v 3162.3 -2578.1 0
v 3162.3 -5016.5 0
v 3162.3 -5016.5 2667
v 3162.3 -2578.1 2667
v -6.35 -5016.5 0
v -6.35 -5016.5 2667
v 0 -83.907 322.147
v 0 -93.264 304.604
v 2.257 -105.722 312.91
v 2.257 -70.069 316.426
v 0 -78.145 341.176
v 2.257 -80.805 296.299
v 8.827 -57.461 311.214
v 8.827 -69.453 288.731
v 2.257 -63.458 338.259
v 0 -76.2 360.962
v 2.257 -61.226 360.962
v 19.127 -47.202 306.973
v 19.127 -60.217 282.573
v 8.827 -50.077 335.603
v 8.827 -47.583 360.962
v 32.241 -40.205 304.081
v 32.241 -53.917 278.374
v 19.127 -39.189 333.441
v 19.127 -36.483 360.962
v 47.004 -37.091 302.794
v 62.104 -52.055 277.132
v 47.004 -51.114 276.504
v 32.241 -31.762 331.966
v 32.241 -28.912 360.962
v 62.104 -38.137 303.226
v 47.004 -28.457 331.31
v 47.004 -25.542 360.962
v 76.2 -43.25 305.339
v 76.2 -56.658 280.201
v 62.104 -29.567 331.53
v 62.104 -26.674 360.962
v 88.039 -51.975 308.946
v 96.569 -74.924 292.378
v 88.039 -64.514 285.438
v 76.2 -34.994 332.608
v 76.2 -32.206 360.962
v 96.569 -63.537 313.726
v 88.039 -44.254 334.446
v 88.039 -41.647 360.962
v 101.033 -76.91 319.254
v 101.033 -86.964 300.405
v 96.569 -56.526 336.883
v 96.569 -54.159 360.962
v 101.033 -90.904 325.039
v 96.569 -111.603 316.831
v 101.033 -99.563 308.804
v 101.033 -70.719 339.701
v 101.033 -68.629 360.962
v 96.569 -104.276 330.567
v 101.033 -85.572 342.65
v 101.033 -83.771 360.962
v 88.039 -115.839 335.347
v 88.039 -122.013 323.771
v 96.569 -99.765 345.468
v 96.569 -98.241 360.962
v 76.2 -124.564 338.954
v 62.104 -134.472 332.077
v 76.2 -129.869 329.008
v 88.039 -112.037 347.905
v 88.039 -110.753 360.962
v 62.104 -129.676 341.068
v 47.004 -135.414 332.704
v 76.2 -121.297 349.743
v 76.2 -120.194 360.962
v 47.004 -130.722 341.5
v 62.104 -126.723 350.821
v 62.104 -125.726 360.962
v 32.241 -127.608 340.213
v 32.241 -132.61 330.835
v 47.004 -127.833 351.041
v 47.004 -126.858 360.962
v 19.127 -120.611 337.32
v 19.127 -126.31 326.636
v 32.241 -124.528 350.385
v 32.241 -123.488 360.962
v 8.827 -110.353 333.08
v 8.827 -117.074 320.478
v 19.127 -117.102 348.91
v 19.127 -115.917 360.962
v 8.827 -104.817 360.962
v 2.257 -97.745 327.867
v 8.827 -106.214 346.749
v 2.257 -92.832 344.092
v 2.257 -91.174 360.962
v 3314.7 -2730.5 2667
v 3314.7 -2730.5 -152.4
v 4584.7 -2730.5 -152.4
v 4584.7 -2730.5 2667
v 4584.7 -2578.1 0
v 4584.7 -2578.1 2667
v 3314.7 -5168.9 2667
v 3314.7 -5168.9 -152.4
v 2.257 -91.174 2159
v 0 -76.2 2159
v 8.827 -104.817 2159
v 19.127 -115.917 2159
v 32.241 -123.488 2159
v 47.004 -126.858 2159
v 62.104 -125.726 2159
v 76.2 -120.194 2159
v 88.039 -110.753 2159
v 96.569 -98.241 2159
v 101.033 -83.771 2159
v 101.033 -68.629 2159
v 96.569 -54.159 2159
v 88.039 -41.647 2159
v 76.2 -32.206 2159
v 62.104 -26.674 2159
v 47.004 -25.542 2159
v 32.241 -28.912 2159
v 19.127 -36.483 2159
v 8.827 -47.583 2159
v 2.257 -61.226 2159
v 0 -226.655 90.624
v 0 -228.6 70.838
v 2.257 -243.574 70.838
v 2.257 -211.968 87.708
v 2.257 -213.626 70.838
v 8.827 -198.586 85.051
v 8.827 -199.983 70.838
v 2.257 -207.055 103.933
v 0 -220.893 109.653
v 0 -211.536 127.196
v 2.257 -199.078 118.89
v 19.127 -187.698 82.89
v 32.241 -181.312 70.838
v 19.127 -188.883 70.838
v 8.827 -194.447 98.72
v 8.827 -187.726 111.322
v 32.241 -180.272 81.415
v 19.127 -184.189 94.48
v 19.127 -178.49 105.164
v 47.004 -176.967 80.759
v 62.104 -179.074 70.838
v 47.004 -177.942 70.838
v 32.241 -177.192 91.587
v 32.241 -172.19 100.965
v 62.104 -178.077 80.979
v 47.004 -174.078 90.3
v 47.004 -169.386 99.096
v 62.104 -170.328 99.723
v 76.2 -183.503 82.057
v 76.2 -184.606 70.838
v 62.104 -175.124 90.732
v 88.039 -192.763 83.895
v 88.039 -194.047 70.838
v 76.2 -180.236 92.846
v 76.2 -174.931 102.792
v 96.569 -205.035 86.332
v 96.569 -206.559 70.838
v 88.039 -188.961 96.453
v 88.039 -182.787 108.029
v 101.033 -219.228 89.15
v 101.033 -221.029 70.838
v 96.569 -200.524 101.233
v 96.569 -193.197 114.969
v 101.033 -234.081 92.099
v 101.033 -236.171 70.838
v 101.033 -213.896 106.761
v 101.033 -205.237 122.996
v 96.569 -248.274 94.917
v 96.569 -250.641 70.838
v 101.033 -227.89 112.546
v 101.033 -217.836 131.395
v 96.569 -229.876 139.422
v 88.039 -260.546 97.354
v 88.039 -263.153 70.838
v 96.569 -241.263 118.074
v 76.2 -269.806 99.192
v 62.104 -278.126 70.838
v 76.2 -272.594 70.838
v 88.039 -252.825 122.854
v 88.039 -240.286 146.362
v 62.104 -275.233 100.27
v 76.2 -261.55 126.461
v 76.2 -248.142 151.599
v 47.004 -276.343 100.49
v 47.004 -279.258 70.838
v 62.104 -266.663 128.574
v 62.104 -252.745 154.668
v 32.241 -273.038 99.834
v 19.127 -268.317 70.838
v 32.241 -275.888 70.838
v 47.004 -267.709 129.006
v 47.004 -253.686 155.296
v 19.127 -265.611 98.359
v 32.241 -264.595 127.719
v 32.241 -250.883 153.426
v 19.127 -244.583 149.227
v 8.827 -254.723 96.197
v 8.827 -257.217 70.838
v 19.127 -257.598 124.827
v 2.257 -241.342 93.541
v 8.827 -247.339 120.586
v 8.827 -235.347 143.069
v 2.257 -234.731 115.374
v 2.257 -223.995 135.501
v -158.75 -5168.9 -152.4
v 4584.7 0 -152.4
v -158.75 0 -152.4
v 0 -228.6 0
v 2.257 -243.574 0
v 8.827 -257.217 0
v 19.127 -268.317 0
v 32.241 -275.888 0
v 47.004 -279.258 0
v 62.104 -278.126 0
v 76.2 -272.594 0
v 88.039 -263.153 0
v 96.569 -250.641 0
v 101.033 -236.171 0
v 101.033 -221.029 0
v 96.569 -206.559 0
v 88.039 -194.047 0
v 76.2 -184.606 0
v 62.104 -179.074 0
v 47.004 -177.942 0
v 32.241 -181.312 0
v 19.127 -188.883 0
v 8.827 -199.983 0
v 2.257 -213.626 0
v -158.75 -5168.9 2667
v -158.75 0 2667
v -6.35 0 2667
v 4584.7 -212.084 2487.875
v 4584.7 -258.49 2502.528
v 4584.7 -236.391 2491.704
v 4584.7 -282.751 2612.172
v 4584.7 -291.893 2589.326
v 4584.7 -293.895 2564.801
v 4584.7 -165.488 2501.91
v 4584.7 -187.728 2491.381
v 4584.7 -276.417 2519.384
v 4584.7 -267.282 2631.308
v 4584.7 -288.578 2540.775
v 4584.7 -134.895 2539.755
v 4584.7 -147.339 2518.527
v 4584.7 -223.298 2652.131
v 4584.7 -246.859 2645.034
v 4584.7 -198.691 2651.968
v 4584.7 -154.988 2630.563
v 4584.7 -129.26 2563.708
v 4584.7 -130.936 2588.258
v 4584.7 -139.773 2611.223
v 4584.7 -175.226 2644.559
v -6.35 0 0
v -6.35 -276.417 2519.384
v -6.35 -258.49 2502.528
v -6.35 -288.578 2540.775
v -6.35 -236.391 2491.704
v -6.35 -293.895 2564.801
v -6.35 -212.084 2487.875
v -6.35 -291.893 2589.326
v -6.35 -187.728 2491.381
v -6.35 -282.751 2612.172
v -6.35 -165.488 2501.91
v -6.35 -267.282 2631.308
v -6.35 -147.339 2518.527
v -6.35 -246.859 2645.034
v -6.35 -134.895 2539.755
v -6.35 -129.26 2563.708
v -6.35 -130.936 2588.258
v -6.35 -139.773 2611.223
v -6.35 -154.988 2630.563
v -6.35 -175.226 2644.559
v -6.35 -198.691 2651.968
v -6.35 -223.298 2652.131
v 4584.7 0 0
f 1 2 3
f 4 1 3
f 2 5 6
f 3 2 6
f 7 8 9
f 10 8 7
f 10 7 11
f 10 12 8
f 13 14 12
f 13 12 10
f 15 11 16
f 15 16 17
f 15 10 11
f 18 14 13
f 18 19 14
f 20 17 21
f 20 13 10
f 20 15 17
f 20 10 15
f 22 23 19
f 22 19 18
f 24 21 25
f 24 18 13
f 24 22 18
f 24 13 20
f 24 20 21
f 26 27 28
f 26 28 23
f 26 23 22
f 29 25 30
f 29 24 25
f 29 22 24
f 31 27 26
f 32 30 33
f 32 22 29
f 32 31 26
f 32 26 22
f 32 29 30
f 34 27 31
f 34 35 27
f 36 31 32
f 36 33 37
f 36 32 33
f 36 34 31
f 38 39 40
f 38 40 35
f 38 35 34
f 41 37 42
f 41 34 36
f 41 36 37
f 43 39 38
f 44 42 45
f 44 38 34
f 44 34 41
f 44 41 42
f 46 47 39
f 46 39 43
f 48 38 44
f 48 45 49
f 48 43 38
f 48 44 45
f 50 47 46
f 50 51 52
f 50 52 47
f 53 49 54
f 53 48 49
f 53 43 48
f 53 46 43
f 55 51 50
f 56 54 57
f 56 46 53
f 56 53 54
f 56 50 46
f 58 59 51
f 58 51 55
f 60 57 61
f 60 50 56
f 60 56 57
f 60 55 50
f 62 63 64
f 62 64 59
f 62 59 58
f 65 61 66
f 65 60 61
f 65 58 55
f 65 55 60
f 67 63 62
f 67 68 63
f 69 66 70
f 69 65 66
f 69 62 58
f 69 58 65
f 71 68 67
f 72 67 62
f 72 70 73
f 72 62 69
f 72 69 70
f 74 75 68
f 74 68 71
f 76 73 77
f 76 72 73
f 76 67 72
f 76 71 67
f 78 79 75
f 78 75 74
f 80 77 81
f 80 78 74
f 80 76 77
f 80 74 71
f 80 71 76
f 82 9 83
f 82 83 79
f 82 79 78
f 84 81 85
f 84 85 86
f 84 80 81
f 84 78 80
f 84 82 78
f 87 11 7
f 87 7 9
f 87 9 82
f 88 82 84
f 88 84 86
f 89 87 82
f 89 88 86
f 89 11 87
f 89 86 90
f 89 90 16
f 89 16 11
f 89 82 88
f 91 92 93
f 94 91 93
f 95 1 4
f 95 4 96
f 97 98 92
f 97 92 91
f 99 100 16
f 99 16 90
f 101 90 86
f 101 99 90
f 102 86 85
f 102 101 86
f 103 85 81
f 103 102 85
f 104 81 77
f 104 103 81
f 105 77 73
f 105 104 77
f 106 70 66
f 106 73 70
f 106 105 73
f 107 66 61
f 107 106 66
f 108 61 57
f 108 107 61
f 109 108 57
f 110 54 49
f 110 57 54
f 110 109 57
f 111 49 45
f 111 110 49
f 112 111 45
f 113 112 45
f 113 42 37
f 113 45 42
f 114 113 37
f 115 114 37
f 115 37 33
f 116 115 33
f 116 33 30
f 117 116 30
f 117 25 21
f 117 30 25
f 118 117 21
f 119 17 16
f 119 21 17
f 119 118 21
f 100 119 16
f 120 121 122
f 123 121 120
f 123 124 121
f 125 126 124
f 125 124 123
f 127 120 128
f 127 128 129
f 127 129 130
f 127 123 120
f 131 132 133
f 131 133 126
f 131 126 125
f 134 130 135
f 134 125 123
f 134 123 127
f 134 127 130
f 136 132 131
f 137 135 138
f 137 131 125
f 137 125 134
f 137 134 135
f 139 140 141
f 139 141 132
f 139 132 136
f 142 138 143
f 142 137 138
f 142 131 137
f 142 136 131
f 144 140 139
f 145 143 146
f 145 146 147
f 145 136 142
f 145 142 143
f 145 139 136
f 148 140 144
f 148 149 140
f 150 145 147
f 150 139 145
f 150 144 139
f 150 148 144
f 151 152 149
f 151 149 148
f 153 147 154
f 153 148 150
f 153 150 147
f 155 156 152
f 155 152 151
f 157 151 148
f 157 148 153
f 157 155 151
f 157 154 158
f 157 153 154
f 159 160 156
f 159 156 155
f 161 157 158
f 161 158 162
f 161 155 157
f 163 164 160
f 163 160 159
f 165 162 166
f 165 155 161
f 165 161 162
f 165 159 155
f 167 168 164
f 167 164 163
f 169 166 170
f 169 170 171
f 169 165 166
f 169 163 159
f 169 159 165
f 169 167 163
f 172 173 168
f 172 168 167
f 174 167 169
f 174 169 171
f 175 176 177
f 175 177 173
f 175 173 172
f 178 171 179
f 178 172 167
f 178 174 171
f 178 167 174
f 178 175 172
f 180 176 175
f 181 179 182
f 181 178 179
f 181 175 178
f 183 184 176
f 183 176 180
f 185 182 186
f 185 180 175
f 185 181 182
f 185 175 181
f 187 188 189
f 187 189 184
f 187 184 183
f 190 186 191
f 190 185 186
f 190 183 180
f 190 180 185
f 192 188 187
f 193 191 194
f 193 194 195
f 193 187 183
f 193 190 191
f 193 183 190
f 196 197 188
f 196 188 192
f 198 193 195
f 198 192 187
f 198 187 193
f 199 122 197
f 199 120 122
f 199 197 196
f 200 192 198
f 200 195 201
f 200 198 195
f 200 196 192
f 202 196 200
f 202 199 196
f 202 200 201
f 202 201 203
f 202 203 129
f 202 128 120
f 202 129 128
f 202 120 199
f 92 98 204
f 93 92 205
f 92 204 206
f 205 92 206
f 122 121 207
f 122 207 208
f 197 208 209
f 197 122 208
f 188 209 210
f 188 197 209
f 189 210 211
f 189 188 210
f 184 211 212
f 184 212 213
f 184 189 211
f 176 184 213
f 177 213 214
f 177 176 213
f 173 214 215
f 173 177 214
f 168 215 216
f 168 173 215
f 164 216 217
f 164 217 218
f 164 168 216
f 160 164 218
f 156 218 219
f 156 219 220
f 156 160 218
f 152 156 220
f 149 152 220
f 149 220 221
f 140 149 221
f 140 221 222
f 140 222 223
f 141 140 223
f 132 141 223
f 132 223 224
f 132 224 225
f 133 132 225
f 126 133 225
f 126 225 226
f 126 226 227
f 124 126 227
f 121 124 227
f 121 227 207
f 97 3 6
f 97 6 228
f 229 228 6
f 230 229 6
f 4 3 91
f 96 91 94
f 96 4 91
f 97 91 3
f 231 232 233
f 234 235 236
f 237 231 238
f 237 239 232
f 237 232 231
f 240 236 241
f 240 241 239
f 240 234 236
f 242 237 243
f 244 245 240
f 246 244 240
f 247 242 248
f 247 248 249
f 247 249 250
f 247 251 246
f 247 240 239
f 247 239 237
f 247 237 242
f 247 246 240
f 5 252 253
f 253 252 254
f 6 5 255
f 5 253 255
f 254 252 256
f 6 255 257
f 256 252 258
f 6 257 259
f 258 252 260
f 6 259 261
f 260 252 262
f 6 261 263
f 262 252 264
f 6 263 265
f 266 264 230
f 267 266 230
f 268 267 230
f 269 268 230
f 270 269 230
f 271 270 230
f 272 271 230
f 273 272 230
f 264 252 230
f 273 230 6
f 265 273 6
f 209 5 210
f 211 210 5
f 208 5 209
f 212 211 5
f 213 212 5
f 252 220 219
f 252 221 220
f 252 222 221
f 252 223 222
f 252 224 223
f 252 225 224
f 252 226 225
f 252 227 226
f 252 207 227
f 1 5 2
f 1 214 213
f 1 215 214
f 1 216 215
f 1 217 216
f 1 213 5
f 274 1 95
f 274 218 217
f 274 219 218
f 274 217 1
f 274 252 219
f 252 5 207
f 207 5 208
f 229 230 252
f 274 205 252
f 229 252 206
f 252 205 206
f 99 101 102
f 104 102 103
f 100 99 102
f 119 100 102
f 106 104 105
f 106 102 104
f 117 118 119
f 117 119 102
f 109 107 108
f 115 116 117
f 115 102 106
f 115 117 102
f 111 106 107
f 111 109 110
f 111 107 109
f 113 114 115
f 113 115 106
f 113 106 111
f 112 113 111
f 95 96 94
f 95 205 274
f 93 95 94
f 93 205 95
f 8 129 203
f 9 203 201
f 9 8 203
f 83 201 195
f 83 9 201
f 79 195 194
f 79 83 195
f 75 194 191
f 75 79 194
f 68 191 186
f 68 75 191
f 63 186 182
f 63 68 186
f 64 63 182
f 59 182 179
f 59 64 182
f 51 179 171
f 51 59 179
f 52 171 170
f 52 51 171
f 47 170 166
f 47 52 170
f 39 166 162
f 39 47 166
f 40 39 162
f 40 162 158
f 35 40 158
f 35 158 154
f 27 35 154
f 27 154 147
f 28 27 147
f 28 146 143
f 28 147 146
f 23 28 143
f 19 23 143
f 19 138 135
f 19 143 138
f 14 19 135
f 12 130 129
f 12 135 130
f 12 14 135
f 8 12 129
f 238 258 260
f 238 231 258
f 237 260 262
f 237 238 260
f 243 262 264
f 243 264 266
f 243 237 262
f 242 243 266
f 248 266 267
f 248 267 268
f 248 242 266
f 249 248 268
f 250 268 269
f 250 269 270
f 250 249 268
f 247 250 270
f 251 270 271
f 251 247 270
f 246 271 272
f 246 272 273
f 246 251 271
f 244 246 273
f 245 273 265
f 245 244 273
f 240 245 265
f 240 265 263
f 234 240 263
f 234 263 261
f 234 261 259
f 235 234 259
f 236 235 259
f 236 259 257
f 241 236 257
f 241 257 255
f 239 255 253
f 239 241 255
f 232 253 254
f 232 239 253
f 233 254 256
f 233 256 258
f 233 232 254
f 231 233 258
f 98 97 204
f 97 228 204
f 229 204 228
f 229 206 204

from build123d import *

# Parameters (mm, degrees)
F3_DEPTH  = 152.4
F4_DEPTH  = 6.35
F5_DEPTH  = 152.4
F6_DEPTH  = 2667
F7_DEPTH  = 4584.7
F8_DEPTH  = 152.4
F9_DEPTH  = 152.4
F10_DEPTH = 2667
F11_DEPTH = 152.4
F12_DEPTH = 2438.4
F13_DEPTH = 152.4
F14_DEPTH = 2667


with BuildPart() as f2:
    # F2: sweep along a path in F1
    with BuildLine(Plane.YZ) as f2_path:
        Line((-228.6, 0), (-228.6, 70.8379952064))
        ThreePointArc((-228.6, 70.8379952064), (-224.2405498913, 100.2800647132), (-211.5363099047, 127.1955351429))
        Line((-211.5363099047, 127.1955351429), (-93.2636900953, 304.6044648571))
        ThreePointArc((-93.2636900953, 304.6044648571), (-80.5594501087, 331.5199352868), (-76.2, 360.9620047936))
        Line((-76.2, 360.9620047936), (-76.2, 2159))
    # F0 (on Top) → F2 (sweep)
    with BuildSketch(Plane.XY):
        with BuildLine():
            ThreePointArc((101.6, -228.6), (50.8, -177.8), (0, -228.6))
            ThreePointArc((0, -228.6), (50.8, -279.4), (101.6, -228.6))
        make_face()
    sweep(path=f2_path.line)

    # F0 (on Top) → F3 (join)
    with BuildSketch(Plane.XY):
        Polygon((4584.7, 0), (0, 0), (0, -228.6), (0, -5016.5), (3162.3, -5016.5), (3162.3, -2578.1), (4584.7, -2578.1), align=None)
        with BuildLine():
            ThreePointArc((101.6, -228.6), (50.8, -279.4), (0, -228.6))
            ThreePointArc((0, -228.6), (50.8, -177.8), (101.6, -228.6))
        make_face(mode=Mode.SUBTRACT)
        with BuildLine():
            ThreePointArc((101.6, -228.6), (50.8, -177.8), (0, -228.6))
            ThreePointArc((0, -228.6), (50.8, -279.4), (101.6, -228.6))
        make_face()
    extrude(amount=-F3_DEPTH)

    # F4 (add): a face of the model
    f4_faces = [f2.faces().sort_by_distance(p)[0] for p in [
        (0, -2508.25, -76.2),
    ]]
    extrude(f4_faces, amount=F4_DEPTH)


with BuildPart() as f5:
    # F5 (new): a face of the model
    f5_faces = [f2.part.faces().sort_by_distance(p)[0] for p in [
        (-6.35, -2508.25, -76.2),
    ]]
    extrude(f5_faces, amount=F5_DEPTH)


with BuildPart() as f2_1:
    add(f2.part)

    # F6 (add): a face of the model
    f6_faces = [f5.part.faces().sort_by_distance(p)[0] for p in [
        (-82.55, -2508.25, 0),
    ]]

    add(f5.part)  # F6 merges F5
    extrude(f6_faces, amount=F6_DEPTH)



with BuildPart() as f7:
    # F1 (on Right) → F7 (new body, through all)
    with BuildSketch(Plane.YZ):
        with BuildLine():
            ThreePointArc((-128.9863099047, 2570.4233621877), (-269.7139069473, 2628.9884516383), (-212.0843039048, 2487.8751810898))
            ThreePointArc((-212.0843039048, 2487.8751810898), (-153.3587128622, 2511.8582727371), (-128.9863099047, 2570.4233621877))
        make_face()
    extrude(amount=F7_DEPTH)


with BuildPart() as f2_2:
    add(f2_1.part)

    add(f7.part)  # F8 merges F7
    # F1 (on Right) → F8 (join)
    with BuildSketch(Plane.YZ):
        with BuildLine():
            ThreePointArc((-128.9863099047, 2570.4233621877), (-269.7139069473, 2628.9884516383), (-212.0843039048, 2487.8751810898))
            ThreePointArc((-212.0843039048, 2487.8751810898), (-153.3587128622, 2511.8582727371), (-128.9863099047, 2570.4233621877))
        make_face()
    extrude(amount=-F8_DEPTH)


with BuildPart() as f9:
    # F9 (new): a face of the model
    f9_faces = [f2_2.part.faces().sort_by_distance(p)[0] for p in [
        (1501.775, -5016.5, -108.8358066039),
    ]]
    extrude(f9_faces, amount=F9_DEPTH)


with BuildPart() as f2_3:
    add(f2_2.part)

    # F10 (add, through all): a face of the model
    f10_faces = [f9.part.faces().sort_by_distance(p)[0] for p in [
        (1577.975, -5092.7, 0),
    ]]

    add(f9.part)  # F10 merges F9
    extrude(f10_faces, amount=F10_DEPTH)


with BuildPart() as f11:
    # F11 (new): a face of the model
    f11_faces = [f2_3.part.faces().sort_by_distance(p)[0] for p in [
        (3162.3, -3873.5, -114.1099738835),
    ]]
    extrude(f11_faces, amount=F11_DEPTH)


with BuildPart() as f2_4:
    add(f2_3.part)

    # F12 (add, through all): a face of the model
    f12_faces = [f11.part.faces().sort_by_distance(p)[0] for p in [
        (3238.5, -5016.5, 1333.5),
    ]]

    add(f11.part)  # F12 merges F11
    extrude(f12_faces, amount=F12_DEPTH)


with BuildPart() as f13:
    # F13 (new): a face of the model
    f13_faces = [f2_4.part.faces().sort_by_distance(p)[0] for p in [
        (3949.7, -2578.1, -76.2),
    ]]
    extrude(f13_faces, amount=F13_DEPTH)


with BuildPart() as f2_5:
    add(f2_4.part)

    # F14 (add, through all): a face of the model
    f14_faces = [f13.part.faces().sort_by_distance(p)[0] for p in [
        (3949.7, -2654.3, 0),
    ]]

    add(f13.part)  # F14 merges F13
    extrude(f14_faces, amount=F14_DEPTH)


solid = f2_5.part
